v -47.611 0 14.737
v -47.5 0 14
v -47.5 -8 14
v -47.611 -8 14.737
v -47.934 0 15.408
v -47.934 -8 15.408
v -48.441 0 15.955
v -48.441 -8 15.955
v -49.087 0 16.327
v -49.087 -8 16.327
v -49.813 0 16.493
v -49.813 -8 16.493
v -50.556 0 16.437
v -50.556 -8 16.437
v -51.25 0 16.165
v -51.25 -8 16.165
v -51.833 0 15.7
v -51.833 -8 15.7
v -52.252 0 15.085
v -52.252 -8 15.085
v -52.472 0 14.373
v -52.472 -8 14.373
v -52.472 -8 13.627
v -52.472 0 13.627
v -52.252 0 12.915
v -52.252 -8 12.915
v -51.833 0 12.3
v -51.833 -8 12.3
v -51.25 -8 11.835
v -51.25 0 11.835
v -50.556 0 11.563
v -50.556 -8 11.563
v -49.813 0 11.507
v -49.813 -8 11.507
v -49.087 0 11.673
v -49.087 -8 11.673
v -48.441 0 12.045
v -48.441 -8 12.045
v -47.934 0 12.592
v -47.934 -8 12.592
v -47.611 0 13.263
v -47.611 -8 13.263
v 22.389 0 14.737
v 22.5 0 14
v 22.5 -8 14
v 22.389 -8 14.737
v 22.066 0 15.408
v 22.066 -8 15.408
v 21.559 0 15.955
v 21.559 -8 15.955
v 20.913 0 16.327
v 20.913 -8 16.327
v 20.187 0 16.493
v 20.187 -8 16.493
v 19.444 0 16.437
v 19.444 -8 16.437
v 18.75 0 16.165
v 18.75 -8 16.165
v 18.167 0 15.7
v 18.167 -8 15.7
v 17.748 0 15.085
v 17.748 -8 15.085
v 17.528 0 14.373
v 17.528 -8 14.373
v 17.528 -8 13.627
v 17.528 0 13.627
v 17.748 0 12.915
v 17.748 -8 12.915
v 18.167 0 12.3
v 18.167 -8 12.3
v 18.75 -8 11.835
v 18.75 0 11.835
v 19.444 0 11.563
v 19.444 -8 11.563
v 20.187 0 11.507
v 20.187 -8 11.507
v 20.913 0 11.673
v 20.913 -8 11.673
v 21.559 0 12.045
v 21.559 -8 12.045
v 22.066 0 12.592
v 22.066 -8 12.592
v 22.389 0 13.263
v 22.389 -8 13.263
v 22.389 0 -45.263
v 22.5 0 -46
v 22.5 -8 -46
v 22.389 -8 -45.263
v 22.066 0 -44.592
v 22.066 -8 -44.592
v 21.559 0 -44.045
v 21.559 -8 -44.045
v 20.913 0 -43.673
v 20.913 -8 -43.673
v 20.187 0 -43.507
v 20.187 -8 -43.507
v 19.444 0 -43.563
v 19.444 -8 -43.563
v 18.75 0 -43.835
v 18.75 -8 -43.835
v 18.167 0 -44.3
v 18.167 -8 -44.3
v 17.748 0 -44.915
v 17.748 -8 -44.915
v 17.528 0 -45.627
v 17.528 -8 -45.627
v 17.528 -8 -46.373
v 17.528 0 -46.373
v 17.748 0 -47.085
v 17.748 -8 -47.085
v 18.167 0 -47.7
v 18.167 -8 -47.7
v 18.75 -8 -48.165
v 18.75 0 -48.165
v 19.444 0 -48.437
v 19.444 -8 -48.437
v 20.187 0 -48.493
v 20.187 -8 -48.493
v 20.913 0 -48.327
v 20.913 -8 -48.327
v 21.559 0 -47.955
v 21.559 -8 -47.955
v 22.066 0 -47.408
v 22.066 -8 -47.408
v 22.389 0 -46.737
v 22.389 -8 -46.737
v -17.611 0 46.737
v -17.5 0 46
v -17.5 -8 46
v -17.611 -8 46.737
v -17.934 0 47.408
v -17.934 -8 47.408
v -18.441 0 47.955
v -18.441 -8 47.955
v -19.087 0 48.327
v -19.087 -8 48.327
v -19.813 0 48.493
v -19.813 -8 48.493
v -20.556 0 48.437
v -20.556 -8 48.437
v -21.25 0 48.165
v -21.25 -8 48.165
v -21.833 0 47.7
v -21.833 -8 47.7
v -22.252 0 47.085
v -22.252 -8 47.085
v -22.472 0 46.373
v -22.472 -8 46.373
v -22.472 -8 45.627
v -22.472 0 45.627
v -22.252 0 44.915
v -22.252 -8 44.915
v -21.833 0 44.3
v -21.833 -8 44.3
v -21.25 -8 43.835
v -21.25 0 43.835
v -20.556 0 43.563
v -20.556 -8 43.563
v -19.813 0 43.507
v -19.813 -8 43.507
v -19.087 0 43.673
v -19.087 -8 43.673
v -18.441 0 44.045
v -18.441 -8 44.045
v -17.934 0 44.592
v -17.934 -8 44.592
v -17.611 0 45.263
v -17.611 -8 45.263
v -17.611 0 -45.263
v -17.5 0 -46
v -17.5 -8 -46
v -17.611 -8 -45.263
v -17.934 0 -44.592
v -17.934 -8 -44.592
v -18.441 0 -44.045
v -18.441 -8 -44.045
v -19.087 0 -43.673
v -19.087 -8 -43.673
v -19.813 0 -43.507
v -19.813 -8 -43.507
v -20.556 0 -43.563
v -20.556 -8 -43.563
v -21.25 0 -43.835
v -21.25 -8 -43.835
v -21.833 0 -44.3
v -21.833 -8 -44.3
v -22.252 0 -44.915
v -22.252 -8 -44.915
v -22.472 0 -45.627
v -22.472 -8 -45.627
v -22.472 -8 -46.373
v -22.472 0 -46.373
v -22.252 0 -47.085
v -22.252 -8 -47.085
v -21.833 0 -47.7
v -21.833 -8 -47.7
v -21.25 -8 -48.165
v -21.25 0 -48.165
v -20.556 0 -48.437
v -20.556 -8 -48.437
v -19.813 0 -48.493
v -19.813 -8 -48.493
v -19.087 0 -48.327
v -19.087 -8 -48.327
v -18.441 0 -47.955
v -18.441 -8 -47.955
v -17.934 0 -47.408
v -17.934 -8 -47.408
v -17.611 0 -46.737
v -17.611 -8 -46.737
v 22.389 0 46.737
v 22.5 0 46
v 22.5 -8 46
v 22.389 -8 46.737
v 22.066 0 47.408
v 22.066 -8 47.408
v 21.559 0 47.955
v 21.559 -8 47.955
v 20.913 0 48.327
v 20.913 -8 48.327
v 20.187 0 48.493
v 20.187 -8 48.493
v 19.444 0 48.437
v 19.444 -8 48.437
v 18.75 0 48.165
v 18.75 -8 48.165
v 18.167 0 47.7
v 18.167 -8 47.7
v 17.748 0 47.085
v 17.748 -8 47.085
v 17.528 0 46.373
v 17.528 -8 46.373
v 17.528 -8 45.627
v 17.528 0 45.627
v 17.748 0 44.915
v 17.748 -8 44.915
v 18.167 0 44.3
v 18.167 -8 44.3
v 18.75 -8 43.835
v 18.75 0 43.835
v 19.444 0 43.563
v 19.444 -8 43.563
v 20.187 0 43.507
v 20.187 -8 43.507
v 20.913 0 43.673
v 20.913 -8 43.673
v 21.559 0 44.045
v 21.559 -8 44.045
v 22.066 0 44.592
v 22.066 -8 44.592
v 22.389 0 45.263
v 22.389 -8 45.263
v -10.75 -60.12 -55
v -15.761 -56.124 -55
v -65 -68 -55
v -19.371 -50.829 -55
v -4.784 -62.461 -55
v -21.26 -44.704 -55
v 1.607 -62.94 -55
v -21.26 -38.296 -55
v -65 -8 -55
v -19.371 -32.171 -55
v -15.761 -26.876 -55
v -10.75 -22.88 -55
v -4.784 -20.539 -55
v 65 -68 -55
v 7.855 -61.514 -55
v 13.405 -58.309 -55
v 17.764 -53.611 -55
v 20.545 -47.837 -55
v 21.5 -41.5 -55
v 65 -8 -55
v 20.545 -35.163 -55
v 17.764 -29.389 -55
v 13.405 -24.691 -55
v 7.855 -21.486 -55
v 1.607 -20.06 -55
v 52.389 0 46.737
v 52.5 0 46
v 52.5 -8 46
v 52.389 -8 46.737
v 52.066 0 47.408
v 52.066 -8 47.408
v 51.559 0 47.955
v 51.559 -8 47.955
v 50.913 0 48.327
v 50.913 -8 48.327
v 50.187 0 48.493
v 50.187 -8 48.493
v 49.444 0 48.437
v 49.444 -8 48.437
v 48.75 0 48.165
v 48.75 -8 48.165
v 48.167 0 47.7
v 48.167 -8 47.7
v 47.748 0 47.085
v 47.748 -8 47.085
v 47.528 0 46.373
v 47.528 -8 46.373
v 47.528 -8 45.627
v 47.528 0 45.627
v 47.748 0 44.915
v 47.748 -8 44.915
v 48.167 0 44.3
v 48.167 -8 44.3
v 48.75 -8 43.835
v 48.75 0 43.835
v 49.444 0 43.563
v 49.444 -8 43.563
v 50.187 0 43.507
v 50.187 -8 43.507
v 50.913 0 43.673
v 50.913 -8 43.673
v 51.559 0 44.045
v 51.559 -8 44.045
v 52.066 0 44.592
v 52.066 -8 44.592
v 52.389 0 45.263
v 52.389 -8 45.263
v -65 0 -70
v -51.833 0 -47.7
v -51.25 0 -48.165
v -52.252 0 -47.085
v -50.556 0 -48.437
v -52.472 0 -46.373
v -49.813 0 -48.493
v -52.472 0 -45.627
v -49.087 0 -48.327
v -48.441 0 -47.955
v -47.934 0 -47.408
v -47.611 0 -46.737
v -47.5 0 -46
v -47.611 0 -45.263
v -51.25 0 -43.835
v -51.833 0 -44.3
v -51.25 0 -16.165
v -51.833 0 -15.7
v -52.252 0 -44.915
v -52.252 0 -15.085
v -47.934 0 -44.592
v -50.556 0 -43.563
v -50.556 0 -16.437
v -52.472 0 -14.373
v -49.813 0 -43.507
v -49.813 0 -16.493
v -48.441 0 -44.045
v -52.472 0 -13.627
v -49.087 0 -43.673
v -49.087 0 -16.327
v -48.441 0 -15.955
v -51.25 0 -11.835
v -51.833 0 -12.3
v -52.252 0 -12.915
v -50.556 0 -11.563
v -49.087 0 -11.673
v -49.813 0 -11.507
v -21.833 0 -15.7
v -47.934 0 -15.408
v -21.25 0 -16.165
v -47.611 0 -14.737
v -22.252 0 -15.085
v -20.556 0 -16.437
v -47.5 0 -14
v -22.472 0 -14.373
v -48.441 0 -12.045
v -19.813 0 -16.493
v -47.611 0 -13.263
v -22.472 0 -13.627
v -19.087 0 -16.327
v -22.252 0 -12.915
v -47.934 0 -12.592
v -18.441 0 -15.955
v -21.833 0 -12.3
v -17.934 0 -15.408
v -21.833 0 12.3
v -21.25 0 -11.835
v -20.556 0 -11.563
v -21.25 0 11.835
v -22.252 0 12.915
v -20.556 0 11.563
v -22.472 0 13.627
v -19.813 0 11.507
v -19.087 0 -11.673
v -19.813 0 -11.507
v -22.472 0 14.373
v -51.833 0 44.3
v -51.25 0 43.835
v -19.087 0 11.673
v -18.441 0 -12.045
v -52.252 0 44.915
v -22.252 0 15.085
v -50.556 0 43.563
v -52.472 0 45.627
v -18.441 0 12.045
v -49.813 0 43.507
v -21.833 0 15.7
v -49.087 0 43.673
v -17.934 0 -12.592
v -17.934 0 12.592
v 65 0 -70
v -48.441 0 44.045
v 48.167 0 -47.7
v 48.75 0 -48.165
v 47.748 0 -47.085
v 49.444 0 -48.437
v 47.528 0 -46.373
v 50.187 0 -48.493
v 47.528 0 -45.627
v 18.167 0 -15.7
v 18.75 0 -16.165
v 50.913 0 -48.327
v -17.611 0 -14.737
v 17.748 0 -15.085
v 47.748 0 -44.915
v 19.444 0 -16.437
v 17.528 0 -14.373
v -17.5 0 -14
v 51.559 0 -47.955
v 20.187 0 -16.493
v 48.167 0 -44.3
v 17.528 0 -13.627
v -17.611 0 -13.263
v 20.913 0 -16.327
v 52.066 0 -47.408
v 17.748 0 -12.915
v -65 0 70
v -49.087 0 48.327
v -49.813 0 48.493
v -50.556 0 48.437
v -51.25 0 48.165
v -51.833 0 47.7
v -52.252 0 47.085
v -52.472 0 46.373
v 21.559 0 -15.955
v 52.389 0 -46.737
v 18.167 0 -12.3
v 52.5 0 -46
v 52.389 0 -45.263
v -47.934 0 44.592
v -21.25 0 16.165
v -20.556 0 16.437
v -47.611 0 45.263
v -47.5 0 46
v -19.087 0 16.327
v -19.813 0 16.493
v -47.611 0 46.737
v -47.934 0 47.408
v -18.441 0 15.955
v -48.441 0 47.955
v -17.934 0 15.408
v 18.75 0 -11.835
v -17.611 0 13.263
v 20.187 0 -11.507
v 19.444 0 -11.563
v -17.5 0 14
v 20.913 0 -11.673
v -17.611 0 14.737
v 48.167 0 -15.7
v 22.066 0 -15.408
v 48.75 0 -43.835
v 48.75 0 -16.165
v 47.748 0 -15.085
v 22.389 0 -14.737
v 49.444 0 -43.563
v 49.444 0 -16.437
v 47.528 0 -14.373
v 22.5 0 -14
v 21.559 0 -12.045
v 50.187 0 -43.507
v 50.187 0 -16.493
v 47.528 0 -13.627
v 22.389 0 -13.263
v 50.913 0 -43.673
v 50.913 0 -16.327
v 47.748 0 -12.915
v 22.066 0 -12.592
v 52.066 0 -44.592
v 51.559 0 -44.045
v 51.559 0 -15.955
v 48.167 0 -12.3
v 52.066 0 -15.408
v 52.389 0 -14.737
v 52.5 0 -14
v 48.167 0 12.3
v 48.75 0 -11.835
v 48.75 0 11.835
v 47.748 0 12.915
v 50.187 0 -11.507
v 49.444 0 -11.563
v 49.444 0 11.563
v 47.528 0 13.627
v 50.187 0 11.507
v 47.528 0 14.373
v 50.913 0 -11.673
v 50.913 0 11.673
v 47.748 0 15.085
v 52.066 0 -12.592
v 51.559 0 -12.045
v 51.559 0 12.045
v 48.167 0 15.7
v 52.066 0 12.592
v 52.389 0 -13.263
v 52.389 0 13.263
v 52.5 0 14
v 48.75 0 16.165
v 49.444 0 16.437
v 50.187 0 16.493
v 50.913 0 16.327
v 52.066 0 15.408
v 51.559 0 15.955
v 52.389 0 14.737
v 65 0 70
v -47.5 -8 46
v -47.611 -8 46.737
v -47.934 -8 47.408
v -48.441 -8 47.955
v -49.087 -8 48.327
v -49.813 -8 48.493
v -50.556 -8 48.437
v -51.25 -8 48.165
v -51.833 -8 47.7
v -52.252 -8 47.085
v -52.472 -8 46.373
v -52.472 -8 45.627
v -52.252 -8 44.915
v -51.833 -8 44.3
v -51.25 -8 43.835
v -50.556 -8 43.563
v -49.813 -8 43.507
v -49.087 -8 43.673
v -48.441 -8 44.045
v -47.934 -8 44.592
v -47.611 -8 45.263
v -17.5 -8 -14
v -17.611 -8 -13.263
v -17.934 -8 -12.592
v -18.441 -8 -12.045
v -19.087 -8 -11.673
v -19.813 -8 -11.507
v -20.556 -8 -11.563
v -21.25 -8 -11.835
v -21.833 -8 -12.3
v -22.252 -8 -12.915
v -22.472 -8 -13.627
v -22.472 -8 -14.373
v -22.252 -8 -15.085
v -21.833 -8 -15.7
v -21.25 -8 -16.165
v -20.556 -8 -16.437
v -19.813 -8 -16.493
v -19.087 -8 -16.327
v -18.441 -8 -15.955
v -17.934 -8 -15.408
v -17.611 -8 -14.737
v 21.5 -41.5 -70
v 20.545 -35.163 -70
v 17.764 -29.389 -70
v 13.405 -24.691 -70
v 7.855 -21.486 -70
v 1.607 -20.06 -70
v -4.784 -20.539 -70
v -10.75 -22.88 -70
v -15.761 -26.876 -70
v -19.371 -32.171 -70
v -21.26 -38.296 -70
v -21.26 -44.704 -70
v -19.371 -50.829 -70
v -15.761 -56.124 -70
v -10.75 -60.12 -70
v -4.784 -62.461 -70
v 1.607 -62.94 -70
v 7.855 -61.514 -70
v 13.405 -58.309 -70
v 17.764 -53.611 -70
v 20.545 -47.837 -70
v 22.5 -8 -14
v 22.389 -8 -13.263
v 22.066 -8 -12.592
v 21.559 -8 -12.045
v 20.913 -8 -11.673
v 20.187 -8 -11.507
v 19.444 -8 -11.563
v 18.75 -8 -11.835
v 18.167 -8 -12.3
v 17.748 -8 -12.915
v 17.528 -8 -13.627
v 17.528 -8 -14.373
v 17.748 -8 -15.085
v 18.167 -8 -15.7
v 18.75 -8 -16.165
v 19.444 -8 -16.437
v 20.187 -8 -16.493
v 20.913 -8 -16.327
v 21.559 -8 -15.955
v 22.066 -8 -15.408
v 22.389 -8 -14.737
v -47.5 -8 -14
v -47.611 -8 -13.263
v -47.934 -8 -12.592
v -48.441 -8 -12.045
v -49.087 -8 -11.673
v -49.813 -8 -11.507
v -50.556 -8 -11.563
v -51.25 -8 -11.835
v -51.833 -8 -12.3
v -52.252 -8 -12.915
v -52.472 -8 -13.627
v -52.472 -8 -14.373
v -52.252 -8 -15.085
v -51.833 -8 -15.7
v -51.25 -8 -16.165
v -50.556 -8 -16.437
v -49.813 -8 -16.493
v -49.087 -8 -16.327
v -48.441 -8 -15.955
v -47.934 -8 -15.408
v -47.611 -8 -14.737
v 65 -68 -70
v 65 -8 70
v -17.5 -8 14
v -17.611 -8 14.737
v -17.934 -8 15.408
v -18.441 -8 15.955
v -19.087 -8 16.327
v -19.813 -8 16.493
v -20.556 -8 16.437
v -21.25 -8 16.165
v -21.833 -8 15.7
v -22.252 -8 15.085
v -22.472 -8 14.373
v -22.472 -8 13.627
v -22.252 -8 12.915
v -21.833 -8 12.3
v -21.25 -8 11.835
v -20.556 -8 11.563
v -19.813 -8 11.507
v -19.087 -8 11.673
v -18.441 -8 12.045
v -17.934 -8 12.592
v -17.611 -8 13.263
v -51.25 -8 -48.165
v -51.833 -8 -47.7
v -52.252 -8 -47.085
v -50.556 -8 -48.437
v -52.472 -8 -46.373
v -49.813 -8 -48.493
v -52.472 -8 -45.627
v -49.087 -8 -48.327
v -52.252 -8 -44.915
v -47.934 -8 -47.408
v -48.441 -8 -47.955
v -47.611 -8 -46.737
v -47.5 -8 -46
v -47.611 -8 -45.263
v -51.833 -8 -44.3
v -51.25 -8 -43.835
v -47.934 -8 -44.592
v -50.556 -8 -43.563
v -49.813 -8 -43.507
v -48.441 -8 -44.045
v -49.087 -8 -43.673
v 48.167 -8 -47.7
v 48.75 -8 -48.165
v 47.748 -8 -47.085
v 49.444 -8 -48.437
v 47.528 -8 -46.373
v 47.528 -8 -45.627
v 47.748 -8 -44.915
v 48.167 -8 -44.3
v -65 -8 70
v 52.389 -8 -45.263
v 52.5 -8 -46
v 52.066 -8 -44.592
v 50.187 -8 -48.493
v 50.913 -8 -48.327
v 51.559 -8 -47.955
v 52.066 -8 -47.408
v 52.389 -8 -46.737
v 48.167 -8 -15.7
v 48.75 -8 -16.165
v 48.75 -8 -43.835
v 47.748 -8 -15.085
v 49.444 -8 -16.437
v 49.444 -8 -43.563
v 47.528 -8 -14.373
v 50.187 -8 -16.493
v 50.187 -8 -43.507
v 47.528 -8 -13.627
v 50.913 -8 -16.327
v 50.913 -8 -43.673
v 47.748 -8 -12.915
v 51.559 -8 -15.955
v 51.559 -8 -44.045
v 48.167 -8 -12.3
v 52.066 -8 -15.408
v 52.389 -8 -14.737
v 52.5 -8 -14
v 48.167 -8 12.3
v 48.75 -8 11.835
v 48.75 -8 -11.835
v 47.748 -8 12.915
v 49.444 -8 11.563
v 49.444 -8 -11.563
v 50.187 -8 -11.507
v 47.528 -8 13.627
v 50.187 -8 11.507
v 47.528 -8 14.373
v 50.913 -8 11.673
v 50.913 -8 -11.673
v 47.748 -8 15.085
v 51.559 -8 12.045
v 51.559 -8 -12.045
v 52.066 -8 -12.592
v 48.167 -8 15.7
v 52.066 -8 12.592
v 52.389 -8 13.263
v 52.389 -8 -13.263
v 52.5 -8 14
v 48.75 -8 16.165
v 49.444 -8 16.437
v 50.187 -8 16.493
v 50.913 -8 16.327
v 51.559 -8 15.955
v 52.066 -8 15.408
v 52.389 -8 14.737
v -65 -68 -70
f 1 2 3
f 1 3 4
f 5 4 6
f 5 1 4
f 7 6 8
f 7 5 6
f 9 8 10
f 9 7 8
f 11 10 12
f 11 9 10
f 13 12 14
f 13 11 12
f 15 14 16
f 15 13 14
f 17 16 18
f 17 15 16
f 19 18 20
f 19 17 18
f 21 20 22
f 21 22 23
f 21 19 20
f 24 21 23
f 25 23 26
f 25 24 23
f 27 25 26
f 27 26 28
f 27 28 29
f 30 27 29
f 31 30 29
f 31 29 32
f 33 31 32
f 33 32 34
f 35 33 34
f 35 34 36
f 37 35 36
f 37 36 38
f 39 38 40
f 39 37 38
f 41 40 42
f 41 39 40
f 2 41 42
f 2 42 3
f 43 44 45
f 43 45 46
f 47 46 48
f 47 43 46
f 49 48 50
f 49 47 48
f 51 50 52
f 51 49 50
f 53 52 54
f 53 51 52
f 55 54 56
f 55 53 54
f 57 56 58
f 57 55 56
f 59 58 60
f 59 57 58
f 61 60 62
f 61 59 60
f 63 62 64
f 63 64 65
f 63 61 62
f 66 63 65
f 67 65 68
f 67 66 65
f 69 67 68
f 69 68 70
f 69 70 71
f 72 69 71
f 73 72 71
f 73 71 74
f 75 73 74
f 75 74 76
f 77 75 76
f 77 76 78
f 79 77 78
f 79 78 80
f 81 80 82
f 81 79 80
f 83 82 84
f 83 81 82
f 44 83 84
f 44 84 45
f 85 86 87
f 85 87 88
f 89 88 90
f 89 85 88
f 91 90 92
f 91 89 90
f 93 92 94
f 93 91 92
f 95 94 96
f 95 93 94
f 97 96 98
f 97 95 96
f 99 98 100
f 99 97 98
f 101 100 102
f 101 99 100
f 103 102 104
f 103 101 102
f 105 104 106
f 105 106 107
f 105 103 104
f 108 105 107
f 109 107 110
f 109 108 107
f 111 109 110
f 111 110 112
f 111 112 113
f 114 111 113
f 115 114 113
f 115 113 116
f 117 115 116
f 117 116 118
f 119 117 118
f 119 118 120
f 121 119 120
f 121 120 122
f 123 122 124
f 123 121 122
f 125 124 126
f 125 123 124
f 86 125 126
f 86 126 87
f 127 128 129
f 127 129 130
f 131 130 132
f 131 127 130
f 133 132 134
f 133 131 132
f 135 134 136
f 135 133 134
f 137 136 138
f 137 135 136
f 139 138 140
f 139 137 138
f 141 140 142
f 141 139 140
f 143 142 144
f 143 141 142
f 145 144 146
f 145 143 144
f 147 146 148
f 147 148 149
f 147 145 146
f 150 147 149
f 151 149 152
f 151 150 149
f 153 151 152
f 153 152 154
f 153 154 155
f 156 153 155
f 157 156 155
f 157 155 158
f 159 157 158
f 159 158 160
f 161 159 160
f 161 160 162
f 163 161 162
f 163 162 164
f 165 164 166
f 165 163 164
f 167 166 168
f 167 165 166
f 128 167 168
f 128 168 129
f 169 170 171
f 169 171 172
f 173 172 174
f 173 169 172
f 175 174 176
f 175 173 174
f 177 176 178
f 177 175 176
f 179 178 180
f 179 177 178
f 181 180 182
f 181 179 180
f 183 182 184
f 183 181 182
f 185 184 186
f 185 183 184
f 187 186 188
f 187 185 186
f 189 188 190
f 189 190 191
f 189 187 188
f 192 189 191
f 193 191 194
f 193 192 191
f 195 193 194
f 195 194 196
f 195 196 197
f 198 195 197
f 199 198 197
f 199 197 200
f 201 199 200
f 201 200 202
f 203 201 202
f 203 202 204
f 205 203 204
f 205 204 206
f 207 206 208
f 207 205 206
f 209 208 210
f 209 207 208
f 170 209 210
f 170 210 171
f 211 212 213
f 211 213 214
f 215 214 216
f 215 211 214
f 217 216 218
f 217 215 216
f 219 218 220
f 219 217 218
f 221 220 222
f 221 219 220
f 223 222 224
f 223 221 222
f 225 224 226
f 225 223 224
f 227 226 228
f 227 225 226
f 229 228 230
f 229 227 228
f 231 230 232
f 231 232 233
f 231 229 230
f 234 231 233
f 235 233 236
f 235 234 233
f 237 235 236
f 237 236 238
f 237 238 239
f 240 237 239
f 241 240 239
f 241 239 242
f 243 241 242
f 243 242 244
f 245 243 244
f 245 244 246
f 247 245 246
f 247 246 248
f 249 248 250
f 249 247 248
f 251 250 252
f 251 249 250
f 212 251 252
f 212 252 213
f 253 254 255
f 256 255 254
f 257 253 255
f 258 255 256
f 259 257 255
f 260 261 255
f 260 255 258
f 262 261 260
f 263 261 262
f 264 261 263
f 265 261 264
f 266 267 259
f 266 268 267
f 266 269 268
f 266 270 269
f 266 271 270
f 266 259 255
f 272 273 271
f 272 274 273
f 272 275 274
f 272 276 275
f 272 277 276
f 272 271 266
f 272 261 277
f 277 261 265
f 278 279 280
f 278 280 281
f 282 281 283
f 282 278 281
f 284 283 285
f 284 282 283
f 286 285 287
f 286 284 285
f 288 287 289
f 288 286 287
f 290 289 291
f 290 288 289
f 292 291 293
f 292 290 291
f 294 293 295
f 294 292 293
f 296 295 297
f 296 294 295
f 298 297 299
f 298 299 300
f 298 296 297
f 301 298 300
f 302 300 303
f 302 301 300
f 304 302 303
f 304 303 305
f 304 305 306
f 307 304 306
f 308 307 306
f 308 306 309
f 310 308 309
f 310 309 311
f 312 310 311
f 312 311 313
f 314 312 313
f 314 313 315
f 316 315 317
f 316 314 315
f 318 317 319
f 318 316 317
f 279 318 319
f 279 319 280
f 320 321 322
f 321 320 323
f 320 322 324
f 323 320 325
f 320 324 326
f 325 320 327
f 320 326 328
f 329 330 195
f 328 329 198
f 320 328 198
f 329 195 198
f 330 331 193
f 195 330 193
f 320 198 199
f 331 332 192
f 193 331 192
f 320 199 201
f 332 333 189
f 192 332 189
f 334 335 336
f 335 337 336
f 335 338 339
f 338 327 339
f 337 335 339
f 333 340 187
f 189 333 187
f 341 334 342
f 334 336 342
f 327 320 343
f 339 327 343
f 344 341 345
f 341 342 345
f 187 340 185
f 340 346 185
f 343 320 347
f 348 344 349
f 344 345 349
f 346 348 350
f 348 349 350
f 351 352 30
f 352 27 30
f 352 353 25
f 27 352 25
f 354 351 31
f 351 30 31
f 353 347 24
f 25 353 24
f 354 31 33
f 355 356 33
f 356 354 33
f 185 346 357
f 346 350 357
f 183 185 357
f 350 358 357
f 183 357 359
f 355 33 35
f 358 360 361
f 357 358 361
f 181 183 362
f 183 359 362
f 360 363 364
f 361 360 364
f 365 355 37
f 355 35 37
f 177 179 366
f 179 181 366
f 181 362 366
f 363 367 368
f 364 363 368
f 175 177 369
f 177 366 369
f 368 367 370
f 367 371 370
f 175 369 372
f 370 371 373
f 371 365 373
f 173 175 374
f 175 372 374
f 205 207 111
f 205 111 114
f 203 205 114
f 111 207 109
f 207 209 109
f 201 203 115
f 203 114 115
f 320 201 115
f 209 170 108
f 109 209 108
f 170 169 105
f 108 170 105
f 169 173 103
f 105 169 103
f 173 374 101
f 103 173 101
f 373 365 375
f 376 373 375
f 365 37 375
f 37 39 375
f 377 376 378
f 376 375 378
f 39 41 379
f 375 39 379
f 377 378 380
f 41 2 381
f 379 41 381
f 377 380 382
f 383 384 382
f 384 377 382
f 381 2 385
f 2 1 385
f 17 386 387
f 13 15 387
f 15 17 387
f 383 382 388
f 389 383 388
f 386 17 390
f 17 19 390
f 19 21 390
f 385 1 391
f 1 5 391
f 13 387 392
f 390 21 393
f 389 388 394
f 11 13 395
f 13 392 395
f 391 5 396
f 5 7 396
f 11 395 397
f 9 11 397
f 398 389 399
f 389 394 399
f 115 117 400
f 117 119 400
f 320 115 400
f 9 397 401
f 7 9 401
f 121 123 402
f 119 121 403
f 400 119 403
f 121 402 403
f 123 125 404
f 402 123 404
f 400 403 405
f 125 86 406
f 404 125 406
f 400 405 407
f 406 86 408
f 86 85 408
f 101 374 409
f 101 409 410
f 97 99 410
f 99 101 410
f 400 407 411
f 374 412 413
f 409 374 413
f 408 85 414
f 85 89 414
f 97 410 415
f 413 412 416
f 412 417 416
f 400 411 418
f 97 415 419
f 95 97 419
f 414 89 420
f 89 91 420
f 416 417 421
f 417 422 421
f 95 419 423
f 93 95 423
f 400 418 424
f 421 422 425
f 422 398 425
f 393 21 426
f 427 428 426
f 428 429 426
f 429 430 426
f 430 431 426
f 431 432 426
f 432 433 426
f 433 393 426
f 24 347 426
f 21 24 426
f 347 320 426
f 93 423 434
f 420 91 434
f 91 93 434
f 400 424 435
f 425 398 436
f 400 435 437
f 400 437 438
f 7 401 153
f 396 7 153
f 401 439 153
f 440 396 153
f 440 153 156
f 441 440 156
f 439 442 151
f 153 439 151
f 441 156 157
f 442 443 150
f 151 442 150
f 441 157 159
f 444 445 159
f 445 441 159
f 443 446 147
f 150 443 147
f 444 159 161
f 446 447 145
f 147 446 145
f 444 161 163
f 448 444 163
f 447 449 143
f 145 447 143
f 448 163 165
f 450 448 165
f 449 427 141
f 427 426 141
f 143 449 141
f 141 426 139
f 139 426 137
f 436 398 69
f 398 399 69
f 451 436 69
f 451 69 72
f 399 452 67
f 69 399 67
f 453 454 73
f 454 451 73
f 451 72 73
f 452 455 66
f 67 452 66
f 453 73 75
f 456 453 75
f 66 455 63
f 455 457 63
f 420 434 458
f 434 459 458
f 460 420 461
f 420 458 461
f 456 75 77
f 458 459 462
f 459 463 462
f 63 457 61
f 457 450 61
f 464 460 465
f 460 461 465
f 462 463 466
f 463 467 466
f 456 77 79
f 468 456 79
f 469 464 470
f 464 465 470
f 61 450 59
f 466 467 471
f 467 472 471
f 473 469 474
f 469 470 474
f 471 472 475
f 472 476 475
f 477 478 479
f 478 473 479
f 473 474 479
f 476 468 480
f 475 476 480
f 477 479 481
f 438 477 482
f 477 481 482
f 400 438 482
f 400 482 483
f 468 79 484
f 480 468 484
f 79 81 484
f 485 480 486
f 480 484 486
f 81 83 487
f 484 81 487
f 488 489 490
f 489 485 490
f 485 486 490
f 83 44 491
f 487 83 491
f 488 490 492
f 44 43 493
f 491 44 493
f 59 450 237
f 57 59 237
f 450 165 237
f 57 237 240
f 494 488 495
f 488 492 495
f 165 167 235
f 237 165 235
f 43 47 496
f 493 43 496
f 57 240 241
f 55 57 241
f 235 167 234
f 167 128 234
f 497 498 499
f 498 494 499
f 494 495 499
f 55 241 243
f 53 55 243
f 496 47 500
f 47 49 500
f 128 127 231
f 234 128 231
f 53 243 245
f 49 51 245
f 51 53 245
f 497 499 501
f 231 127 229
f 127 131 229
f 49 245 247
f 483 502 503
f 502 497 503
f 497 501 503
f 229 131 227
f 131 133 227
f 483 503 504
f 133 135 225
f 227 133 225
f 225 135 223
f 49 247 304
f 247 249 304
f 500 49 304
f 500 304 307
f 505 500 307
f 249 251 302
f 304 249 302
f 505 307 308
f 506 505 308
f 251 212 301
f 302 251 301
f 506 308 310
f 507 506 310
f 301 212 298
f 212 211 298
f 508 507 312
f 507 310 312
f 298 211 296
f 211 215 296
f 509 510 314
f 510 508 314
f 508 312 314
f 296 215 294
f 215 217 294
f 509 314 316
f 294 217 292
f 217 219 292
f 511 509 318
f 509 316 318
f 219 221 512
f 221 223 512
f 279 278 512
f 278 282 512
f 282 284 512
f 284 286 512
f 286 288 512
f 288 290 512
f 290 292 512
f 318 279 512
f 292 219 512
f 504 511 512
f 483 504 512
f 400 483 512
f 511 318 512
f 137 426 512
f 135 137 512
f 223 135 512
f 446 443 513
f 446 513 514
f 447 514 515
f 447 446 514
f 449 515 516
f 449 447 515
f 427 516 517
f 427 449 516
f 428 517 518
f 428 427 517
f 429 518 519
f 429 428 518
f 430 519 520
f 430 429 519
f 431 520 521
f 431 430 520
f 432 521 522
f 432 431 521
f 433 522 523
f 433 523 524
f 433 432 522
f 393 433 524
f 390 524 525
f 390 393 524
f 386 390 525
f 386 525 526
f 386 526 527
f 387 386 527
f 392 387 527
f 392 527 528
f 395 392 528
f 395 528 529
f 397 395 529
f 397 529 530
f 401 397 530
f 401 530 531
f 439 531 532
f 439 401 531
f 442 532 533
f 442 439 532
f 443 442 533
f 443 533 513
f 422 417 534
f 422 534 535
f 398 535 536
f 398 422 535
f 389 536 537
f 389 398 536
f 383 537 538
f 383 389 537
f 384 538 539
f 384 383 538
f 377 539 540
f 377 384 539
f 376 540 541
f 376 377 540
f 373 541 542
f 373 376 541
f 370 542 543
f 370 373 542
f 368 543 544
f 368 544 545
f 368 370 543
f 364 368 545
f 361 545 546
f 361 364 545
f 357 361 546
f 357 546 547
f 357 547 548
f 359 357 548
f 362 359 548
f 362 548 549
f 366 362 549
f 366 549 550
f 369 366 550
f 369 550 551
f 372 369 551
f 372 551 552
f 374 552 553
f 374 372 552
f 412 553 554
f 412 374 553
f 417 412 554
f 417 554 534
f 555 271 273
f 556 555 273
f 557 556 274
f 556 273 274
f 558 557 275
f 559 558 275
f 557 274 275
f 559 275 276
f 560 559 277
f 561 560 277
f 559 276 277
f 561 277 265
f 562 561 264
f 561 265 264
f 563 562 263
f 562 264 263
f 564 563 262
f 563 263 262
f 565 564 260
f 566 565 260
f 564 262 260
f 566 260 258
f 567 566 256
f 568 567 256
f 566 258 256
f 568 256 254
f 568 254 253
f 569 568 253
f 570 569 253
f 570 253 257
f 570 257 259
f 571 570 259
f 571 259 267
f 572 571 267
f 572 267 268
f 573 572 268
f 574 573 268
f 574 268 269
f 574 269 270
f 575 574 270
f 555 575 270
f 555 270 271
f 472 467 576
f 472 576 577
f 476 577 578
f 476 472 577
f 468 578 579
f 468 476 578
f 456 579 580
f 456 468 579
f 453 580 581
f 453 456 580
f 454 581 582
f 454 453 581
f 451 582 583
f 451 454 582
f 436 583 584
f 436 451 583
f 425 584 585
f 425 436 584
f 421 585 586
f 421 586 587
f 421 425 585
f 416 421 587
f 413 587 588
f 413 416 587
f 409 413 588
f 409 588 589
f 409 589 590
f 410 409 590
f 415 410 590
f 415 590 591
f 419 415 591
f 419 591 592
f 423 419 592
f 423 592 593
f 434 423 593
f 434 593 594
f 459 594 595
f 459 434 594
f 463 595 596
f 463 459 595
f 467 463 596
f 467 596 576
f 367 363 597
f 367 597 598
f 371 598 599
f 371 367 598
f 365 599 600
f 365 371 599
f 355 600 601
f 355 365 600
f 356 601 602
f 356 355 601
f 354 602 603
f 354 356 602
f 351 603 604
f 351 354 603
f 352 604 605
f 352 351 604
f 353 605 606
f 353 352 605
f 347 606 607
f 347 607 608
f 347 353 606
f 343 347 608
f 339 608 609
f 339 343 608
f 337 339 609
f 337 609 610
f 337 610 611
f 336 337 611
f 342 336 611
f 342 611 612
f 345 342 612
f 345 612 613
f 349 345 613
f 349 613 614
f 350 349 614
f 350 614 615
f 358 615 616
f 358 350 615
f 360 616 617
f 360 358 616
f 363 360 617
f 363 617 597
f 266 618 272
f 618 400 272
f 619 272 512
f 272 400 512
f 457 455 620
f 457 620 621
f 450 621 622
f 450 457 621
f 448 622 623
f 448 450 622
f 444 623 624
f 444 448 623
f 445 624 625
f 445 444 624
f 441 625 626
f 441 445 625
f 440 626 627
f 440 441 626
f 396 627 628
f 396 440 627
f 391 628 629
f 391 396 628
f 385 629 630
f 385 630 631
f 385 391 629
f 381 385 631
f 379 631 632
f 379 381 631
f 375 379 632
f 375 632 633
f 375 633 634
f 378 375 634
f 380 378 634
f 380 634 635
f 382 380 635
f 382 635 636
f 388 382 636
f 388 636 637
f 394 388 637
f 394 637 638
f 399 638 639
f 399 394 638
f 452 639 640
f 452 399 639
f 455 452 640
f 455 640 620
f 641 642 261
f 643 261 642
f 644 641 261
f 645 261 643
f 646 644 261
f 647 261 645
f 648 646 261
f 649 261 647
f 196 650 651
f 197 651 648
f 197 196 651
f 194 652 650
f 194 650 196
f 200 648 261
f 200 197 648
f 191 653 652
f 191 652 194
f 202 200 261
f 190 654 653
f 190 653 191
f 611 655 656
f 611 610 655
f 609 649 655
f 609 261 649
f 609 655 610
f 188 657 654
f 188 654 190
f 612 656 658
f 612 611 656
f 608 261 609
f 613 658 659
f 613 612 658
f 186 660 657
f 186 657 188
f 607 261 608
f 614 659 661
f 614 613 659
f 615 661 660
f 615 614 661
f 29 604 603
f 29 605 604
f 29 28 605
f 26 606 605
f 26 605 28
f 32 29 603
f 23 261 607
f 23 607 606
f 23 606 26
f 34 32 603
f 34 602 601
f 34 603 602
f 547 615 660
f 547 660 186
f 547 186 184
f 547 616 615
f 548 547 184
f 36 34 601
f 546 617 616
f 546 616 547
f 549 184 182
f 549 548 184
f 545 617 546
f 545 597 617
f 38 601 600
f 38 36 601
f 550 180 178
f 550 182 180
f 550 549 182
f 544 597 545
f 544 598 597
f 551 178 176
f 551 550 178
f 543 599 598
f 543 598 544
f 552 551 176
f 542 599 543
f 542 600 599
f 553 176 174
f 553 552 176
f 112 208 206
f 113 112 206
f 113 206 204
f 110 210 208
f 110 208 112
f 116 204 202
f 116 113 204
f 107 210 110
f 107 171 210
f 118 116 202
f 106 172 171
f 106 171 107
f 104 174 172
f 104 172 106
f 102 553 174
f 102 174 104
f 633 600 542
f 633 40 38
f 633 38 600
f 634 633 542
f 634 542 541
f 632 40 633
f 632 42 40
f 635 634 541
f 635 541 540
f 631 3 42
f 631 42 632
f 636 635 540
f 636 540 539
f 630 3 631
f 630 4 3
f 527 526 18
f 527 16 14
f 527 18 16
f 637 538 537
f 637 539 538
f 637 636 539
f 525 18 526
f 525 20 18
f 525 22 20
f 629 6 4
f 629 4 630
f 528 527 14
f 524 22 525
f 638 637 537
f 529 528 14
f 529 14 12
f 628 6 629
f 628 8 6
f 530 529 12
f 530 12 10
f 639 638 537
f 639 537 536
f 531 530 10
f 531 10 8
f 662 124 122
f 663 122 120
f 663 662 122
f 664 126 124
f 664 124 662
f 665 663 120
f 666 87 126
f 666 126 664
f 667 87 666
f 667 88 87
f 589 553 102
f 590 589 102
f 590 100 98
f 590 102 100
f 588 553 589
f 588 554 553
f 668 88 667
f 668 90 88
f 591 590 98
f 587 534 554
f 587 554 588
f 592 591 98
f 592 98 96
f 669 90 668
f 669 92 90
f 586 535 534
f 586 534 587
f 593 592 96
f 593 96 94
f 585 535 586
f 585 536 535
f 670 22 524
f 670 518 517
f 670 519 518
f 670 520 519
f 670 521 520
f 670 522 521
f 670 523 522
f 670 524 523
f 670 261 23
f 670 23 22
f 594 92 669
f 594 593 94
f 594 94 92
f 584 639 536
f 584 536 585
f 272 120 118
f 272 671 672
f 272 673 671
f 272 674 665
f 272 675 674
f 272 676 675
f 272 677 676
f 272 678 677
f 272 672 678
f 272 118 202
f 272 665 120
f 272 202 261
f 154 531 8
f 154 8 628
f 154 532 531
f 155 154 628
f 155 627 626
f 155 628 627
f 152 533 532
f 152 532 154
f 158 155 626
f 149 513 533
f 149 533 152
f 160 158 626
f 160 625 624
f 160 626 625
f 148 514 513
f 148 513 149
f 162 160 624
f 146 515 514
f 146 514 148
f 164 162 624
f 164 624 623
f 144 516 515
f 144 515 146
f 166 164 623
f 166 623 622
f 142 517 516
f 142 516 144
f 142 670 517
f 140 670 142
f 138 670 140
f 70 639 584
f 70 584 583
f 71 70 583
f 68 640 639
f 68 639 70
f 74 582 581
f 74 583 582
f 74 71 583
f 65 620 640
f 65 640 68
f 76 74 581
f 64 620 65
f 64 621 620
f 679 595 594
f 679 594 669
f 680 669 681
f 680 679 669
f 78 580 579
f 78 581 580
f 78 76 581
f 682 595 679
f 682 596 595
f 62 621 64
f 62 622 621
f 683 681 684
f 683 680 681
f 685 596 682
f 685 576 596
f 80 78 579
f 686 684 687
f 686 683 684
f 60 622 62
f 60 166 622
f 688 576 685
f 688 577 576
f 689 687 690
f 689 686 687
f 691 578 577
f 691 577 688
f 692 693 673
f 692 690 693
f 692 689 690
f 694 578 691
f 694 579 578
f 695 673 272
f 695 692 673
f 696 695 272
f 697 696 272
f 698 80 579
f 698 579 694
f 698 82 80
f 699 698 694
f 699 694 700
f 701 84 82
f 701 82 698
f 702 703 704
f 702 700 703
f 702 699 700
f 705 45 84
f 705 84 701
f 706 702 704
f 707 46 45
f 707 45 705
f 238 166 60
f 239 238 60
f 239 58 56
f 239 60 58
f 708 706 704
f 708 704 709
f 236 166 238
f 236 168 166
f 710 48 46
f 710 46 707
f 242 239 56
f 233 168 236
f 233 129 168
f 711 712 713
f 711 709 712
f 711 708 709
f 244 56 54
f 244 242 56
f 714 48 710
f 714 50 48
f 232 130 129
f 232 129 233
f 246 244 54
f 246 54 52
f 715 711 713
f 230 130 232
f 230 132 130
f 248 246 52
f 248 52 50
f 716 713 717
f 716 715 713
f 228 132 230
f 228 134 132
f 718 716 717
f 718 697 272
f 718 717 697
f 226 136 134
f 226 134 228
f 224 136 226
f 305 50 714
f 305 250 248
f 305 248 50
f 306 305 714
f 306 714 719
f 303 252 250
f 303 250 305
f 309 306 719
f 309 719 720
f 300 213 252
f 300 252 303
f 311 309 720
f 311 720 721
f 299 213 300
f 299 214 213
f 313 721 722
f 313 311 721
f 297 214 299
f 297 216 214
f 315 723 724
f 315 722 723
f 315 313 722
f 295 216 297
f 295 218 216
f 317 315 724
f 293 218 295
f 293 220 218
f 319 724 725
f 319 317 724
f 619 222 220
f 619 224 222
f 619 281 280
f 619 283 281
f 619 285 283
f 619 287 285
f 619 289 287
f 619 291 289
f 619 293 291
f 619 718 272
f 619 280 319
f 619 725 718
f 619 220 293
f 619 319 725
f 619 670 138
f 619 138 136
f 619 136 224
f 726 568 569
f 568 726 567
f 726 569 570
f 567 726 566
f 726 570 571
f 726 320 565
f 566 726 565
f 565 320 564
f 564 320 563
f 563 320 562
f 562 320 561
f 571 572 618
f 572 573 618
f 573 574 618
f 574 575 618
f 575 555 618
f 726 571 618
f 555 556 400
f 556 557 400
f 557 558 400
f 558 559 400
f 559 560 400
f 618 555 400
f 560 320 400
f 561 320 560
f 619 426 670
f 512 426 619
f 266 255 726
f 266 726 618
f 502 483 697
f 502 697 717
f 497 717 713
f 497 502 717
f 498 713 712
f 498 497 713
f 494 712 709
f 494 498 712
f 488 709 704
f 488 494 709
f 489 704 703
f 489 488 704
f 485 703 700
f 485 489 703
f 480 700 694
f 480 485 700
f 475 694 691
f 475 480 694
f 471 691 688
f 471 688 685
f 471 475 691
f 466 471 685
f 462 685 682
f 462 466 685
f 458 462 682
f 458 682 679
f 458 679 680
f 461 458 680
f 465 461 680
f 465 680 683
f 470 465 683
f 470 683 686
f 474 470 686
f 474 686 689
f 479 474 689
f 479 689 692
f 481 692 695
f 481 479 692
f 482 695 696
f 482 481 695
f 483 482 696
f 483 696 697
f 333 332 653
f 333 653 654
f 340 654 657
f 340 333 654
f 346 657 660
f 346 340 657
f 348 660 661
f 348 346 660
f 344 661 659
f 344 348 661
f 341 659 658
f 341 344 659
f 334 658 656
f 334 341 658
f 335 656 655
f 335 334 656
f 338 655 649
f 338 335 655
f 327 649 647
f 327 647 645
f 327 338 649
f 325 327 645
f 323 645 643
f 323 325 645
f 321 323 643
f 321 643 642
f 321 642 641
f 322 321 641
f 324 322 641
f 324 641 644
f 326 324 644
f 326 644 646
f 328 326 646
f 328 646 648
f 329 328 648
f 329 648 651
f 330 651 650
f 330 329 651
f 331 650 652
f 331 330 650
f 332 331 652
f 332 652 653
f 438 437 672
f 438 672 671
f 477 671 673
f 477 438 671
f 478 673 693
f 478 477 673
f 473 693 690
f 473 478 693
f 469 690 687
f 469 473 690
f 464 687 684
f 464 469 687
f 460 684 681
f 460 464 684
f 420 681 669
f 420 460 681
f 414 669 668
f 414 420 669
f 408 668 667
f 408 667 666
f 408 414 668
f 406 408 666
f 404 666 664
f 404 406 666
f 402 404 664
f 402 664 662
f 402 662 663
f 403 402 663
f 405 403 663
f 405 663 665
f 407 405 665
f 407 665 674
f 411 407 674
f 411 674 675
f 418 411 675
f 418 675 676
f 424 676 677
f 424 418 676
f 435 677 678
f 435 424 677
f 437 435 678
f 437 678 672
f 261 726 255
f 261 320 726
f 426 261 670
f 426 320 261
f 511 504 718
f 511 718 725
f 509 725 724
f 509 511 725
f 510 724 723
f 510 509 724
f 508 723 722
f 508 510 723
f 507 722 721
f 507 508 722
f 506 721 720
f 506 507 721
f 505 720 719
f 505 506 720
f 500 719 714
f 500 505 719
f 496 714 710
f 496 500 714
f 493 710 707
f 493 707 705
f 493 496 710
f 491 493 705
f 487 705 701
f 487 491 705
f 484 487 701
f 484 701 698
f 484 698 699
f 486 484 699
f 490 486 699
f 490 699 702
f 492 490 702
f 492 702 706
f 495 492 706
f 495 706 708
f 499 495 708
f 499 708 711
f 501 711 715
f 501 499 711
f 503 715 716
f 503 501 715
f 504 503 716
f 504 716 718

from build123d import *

# Parameters (mm, degrees)
F0_W     = 130
F0_H     = 140
F0_R     = 2.5
F1_DEPTH = 8
F2_W     = 130
F2_H     = 15
F3_DEPTH = 60
F4_R     = 21.5
F5_DEPTH = 25


with BuildPart() as f1:
    # F0 (on Front) → F1 (new body)
    with BuildSketch(Plane.XZ):
        Rectangle(F0_W, F0_H)
        with Locations((-50, -46)):
            Circle(F0_R, mode=Mode.SUBTRACT)
        with Locations((-20, -46)):
            Circle(F0_R, mode=Mode.SUBTRACT)
        with Locations((-50, -14)):
            Circle(F0_R, mode=Mode.SUBTRACT)
        with Locations((-20, -14)):
            Circle(F0_R, mode=Mode.SUBTRACT)
        with Locations((20, -46)):
            Circle(F0_R, mode=Mode.SUBTRACT)
        with Locations((50, -46)):
            Circle(F0_R, mode=Mode.SUBTRACT)
        with Locations((20, -14)):
            Circle(F0_R, mode=Mode.SUBTRACT)
        with Locations((50, -14)):
            Circle(F0_R, mode=Mode.SUBTRACT)
        with Locations((-50, 14)):
            Circle(F0_R, mode=Mode.SUBTRACT)
        with Locations((-20, 14)):
            Circle(F0_R, mode=Mode.SUBTRACT)
        with Locations((-50, 46)):
            Circle(F0_R, mode=Mode.SUBTRACT)
        with Locations((-20, 46)):
            Circle(F0_R, mode=Mode.SUBTRACT)
        with Locations((20, 14)):
            Circle(F0_R, mode=Mode.SUBTRACT)
        with Locations((50, 14)):
            Circle(F0_R, mode=Mode.SUBTRACT)
        with Locations((20, 46)):
            Circle(F0_R, mode=Mode.SUBTRACT)
        with Locations((50, 46)):
            Circle(F0_R, mode=Mode.SUBTRACT)
    extrude(amount=F1_DEPTH)

    # F2 (on face) → F3 (join)
    with BuildSketch(Plane.XZ.offset(8)):
        with Locations((0, -62.5)):
            Rectangle(F2_W, F2_H)
    extrude(amount=F3_DEPTH)

    # F4 (on face) → F5 (cut)
    with BuildSketch(Plane.XY.offset(-55)):
        with Locations((0, -41.5)):
            Circle(F4_R)
    extrude(amount=-F5_DEPTH, mode=Mode.SUBTRACT)


solid = f1.part
